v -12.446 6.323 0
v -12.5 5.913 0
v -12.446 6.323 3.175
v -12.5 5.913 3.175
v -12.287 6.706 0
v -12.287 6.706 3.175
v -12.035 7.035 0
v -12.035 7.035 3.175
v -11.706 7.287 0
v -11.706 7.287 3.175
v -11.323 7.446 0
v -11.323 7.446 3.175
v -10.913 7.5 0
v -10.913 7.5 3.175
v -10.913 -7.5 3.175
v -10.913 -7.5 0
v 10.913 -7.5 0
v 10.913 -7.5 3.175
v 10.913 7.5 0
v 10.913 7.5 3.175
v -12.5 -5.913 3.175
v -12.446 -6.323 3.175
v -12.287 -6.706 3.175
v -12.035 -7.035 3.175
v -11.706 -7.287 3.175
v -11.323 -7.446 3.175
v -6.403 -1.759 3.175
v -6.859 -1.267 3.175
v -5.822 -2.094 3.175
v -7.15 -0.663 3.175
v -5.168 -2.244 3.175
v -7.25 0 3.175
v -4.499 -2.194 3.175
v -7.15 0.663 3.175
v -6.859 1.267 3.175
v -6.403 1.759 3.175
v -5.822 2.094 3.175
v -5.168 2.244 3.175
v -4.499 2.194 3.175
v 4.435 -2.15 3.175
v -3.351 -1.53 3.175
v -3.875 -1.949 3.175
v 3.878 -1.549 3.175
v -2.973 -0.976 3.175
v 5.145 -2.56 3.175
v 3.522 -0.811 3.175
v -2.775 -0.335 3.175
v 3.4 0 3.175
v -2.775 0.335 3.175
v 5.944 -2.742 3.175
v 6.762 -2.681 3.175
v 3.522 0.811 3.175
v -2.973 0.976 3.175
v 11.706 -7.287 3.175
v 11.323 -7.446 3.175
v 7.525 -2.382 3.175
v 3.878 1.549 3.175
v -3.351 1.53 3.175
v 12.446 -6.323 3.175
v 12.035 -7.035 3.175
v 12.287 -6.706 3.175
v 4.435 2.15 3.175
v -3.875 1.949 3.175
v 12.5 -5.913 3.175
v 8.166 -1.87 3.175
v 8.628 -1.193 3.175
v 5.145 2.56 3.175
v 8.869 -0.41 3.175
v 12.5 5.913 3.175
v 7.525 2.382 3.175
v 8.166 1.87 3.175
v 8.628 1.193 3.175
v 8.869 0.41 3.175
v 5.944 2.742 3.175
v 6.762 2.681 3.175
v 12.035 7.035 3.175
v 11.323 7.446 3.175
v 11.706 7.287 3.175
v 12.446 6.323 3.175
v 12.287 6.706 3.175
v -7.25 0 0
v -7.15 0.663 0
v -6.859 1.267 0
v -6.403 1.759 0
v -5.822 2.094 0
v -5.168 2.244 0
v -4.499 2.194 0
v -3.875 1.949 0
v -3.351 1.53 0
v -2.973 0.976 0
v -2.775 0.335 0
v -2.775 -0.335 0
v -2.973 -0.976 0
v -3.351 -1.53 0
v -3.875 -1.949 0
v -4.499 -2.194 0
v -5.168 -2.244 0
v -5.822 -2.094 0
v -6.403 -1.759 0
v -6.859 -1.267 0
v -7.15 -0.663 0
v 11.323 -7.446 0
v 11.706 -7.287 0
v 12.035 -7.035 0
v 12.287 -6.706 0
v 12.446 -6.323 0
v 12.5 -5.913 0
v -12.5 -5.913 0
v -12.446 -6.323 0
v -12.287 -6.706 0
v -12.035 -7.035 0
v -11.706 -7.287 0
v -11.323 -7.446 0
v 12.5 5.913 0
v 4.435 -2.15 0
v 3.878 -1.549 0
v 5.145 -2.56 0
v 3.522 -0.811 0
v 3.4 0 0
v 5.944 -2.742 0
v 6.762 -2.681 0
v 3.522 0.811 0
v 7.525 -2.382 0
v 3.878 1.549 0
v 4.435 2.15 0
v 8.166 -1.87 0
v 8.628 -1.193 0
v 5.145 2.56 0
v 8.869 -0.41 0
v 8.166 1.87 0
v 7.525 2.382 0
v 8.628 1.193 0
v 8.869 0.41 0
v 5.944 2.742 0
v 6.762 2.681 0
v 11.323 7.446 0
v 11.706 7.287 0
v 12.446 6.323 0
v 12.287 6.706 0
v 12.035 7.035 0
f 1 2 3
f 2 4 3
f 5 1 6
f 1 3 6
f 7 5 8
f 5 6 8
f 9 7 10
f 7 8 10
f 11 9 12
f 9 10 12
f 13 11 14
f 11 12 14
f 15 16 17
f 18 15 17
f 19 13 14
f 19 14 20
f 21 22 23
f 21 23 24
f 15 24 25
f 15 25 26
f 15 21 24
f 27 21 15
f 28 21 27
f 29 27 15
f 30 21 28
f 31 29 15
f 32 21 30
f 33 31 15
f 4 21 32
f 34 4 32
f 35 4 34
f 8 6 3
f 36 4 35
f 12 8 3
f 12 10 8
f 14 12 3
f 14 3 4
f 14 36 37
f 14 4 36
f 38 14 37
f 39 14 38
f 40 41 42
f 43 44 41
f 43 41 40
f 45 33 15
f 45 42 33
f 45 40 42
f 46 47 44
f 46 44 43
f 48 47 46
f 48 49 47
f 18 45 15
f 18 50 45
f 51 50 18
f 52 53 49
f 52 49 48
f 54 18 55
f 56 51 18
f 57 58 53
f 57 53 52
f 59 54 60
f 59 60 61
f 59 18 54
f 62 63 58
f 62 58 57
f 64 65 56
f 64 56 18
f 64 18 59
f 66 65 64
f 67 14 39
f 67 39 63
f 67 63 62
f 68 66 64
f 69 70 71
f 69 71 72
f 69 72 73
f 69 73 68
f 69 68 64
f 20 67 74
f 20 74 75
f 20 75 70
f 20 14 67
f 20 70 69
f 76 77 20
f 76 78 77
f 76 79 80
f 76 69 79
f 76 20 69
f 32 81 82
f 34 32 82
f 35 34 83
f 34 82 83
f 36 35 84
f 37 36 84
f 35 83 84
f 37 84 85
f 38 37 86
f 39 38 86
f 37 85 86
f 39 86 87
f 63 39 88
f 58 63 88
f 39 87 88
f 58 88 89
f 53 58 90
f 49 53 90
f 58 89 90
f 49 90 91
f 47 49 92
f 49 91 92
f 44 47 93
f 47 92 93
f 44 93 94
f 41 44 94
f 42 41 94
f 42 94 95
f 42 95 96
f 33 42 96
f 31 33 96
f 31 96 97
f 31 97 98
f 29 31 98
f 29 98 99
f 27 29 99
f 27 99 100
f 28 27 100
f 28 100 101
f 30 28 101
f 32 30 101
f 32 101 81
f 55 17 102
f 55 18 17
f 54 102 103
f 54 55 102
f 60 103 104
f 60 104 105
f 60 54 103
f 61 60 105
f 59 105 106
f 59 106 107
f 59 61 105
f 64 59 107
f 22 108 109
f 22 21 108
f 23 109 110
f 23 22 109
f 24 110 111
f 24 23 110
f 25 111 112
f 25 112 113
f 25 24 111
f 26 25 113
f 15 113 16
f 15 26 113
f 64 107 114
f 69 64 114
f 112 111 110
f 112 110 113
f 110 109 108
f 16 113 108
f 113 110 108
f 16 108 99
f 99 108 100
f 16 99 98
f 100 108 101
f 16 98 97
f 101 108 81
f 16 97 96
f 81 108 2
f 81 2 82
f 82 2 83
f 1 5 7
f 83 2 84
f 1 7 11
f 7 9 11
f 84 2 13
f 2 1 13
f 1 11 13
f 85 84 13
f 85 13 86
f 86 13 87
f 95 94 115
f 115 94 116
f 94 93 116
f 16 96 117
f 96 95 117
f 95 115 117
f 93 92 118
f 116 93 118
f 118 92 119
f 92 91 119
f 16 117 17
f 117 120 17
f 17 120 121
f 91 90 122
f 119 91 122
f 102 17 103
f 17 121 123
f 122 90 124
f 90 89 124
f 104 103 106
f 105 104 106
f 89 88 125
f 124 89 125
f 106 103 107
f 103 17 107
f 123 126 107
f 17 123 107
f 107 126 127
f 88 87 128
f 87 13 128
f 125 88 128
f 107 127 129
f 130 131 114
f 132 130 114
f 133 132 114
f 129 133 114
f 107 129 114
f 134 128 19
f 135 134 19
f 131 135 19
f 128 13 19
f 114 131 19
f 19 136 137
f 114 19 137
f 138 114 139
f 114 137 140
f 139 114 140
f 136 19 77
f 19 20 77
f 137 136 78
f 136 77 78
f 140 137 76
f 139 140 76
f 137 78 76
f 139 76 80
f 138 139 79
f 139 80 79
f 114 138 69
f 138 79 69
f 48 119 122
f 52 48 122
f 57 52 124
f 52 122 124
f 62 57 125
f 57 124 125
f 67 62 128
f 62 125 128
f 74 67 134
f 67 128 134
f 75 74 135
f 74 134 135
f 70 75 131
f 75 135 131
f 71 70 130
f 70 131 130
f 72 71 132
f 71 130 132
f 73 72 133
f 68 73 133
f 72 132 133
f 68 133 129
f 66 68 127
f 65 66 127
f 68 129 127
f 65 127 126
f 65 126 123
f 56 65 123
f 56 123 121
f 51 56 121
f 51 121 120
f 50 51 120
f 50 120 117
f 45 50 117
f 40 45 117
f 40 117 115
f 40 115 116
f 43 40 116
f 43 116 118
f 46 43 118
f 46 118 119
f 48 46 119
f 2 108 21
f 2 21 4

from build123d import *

# Parameters (mm, degrees)
SKETCH1_W            = 25
SKETCH1_H            = 15
SKETCH1_R            = 2.5
BOSS_EXTRUDE1_DEPTH  = 3.175
M5_CLEARANCE_HOLE1_D = 5.5
FILLET1_R            = 1.5875
M4_CLEARANCE_HOLE2_D = 4.5


with BuildPart() as part:
    # Sketch1 → Boss-Extrude1 (new body)
    # profile 1 of 2: a face of its own
    with BuildSketch(Plane.XY):
        Rectangle(SKETCH1_W, SKETCH1_H)
        with Locations((6.15, 0)):
            Circle(SKETCH1_R, mode=Mode.SUBTRACT)
    # profile 2 of 2: a face of its own
    with BuildSketch(Plane.XY):
        with Locations((6.15, 0)):
            Circle(SKETCH1_R)
    extrude(amount=BOSS_EXTRUDE1_DEPTH)

    # M5 Clearance Hole1 (through all)
    with Locations(Plane.XY.offset(3.175)):
        with Locations((6.15, 0)):
            Hole(M5_CLEARANCE_HOLE1_D / 2)

    # Fillet1
    fillet1_edges = [part.edges().sort_by_distance(p)[0] for p in [
        (12.5, -7.5, 1.5875),
        (-12.5, -7.5, 1.5875),
        (-12.5, 7.5, 1.5875),
        (12.5, 7.5, 1.5875),
    ]]
    fillet(fillet1_edges, radius=FILLET1_R)

    # M4 Clearance Hole2 (through all)
    with Locations(Plane.XY.offset(3.175)):
        with Locations((-5, 0)):
            Hole(M4_CLEARANCE_HOLE2_D / 2)


solid = part.part
